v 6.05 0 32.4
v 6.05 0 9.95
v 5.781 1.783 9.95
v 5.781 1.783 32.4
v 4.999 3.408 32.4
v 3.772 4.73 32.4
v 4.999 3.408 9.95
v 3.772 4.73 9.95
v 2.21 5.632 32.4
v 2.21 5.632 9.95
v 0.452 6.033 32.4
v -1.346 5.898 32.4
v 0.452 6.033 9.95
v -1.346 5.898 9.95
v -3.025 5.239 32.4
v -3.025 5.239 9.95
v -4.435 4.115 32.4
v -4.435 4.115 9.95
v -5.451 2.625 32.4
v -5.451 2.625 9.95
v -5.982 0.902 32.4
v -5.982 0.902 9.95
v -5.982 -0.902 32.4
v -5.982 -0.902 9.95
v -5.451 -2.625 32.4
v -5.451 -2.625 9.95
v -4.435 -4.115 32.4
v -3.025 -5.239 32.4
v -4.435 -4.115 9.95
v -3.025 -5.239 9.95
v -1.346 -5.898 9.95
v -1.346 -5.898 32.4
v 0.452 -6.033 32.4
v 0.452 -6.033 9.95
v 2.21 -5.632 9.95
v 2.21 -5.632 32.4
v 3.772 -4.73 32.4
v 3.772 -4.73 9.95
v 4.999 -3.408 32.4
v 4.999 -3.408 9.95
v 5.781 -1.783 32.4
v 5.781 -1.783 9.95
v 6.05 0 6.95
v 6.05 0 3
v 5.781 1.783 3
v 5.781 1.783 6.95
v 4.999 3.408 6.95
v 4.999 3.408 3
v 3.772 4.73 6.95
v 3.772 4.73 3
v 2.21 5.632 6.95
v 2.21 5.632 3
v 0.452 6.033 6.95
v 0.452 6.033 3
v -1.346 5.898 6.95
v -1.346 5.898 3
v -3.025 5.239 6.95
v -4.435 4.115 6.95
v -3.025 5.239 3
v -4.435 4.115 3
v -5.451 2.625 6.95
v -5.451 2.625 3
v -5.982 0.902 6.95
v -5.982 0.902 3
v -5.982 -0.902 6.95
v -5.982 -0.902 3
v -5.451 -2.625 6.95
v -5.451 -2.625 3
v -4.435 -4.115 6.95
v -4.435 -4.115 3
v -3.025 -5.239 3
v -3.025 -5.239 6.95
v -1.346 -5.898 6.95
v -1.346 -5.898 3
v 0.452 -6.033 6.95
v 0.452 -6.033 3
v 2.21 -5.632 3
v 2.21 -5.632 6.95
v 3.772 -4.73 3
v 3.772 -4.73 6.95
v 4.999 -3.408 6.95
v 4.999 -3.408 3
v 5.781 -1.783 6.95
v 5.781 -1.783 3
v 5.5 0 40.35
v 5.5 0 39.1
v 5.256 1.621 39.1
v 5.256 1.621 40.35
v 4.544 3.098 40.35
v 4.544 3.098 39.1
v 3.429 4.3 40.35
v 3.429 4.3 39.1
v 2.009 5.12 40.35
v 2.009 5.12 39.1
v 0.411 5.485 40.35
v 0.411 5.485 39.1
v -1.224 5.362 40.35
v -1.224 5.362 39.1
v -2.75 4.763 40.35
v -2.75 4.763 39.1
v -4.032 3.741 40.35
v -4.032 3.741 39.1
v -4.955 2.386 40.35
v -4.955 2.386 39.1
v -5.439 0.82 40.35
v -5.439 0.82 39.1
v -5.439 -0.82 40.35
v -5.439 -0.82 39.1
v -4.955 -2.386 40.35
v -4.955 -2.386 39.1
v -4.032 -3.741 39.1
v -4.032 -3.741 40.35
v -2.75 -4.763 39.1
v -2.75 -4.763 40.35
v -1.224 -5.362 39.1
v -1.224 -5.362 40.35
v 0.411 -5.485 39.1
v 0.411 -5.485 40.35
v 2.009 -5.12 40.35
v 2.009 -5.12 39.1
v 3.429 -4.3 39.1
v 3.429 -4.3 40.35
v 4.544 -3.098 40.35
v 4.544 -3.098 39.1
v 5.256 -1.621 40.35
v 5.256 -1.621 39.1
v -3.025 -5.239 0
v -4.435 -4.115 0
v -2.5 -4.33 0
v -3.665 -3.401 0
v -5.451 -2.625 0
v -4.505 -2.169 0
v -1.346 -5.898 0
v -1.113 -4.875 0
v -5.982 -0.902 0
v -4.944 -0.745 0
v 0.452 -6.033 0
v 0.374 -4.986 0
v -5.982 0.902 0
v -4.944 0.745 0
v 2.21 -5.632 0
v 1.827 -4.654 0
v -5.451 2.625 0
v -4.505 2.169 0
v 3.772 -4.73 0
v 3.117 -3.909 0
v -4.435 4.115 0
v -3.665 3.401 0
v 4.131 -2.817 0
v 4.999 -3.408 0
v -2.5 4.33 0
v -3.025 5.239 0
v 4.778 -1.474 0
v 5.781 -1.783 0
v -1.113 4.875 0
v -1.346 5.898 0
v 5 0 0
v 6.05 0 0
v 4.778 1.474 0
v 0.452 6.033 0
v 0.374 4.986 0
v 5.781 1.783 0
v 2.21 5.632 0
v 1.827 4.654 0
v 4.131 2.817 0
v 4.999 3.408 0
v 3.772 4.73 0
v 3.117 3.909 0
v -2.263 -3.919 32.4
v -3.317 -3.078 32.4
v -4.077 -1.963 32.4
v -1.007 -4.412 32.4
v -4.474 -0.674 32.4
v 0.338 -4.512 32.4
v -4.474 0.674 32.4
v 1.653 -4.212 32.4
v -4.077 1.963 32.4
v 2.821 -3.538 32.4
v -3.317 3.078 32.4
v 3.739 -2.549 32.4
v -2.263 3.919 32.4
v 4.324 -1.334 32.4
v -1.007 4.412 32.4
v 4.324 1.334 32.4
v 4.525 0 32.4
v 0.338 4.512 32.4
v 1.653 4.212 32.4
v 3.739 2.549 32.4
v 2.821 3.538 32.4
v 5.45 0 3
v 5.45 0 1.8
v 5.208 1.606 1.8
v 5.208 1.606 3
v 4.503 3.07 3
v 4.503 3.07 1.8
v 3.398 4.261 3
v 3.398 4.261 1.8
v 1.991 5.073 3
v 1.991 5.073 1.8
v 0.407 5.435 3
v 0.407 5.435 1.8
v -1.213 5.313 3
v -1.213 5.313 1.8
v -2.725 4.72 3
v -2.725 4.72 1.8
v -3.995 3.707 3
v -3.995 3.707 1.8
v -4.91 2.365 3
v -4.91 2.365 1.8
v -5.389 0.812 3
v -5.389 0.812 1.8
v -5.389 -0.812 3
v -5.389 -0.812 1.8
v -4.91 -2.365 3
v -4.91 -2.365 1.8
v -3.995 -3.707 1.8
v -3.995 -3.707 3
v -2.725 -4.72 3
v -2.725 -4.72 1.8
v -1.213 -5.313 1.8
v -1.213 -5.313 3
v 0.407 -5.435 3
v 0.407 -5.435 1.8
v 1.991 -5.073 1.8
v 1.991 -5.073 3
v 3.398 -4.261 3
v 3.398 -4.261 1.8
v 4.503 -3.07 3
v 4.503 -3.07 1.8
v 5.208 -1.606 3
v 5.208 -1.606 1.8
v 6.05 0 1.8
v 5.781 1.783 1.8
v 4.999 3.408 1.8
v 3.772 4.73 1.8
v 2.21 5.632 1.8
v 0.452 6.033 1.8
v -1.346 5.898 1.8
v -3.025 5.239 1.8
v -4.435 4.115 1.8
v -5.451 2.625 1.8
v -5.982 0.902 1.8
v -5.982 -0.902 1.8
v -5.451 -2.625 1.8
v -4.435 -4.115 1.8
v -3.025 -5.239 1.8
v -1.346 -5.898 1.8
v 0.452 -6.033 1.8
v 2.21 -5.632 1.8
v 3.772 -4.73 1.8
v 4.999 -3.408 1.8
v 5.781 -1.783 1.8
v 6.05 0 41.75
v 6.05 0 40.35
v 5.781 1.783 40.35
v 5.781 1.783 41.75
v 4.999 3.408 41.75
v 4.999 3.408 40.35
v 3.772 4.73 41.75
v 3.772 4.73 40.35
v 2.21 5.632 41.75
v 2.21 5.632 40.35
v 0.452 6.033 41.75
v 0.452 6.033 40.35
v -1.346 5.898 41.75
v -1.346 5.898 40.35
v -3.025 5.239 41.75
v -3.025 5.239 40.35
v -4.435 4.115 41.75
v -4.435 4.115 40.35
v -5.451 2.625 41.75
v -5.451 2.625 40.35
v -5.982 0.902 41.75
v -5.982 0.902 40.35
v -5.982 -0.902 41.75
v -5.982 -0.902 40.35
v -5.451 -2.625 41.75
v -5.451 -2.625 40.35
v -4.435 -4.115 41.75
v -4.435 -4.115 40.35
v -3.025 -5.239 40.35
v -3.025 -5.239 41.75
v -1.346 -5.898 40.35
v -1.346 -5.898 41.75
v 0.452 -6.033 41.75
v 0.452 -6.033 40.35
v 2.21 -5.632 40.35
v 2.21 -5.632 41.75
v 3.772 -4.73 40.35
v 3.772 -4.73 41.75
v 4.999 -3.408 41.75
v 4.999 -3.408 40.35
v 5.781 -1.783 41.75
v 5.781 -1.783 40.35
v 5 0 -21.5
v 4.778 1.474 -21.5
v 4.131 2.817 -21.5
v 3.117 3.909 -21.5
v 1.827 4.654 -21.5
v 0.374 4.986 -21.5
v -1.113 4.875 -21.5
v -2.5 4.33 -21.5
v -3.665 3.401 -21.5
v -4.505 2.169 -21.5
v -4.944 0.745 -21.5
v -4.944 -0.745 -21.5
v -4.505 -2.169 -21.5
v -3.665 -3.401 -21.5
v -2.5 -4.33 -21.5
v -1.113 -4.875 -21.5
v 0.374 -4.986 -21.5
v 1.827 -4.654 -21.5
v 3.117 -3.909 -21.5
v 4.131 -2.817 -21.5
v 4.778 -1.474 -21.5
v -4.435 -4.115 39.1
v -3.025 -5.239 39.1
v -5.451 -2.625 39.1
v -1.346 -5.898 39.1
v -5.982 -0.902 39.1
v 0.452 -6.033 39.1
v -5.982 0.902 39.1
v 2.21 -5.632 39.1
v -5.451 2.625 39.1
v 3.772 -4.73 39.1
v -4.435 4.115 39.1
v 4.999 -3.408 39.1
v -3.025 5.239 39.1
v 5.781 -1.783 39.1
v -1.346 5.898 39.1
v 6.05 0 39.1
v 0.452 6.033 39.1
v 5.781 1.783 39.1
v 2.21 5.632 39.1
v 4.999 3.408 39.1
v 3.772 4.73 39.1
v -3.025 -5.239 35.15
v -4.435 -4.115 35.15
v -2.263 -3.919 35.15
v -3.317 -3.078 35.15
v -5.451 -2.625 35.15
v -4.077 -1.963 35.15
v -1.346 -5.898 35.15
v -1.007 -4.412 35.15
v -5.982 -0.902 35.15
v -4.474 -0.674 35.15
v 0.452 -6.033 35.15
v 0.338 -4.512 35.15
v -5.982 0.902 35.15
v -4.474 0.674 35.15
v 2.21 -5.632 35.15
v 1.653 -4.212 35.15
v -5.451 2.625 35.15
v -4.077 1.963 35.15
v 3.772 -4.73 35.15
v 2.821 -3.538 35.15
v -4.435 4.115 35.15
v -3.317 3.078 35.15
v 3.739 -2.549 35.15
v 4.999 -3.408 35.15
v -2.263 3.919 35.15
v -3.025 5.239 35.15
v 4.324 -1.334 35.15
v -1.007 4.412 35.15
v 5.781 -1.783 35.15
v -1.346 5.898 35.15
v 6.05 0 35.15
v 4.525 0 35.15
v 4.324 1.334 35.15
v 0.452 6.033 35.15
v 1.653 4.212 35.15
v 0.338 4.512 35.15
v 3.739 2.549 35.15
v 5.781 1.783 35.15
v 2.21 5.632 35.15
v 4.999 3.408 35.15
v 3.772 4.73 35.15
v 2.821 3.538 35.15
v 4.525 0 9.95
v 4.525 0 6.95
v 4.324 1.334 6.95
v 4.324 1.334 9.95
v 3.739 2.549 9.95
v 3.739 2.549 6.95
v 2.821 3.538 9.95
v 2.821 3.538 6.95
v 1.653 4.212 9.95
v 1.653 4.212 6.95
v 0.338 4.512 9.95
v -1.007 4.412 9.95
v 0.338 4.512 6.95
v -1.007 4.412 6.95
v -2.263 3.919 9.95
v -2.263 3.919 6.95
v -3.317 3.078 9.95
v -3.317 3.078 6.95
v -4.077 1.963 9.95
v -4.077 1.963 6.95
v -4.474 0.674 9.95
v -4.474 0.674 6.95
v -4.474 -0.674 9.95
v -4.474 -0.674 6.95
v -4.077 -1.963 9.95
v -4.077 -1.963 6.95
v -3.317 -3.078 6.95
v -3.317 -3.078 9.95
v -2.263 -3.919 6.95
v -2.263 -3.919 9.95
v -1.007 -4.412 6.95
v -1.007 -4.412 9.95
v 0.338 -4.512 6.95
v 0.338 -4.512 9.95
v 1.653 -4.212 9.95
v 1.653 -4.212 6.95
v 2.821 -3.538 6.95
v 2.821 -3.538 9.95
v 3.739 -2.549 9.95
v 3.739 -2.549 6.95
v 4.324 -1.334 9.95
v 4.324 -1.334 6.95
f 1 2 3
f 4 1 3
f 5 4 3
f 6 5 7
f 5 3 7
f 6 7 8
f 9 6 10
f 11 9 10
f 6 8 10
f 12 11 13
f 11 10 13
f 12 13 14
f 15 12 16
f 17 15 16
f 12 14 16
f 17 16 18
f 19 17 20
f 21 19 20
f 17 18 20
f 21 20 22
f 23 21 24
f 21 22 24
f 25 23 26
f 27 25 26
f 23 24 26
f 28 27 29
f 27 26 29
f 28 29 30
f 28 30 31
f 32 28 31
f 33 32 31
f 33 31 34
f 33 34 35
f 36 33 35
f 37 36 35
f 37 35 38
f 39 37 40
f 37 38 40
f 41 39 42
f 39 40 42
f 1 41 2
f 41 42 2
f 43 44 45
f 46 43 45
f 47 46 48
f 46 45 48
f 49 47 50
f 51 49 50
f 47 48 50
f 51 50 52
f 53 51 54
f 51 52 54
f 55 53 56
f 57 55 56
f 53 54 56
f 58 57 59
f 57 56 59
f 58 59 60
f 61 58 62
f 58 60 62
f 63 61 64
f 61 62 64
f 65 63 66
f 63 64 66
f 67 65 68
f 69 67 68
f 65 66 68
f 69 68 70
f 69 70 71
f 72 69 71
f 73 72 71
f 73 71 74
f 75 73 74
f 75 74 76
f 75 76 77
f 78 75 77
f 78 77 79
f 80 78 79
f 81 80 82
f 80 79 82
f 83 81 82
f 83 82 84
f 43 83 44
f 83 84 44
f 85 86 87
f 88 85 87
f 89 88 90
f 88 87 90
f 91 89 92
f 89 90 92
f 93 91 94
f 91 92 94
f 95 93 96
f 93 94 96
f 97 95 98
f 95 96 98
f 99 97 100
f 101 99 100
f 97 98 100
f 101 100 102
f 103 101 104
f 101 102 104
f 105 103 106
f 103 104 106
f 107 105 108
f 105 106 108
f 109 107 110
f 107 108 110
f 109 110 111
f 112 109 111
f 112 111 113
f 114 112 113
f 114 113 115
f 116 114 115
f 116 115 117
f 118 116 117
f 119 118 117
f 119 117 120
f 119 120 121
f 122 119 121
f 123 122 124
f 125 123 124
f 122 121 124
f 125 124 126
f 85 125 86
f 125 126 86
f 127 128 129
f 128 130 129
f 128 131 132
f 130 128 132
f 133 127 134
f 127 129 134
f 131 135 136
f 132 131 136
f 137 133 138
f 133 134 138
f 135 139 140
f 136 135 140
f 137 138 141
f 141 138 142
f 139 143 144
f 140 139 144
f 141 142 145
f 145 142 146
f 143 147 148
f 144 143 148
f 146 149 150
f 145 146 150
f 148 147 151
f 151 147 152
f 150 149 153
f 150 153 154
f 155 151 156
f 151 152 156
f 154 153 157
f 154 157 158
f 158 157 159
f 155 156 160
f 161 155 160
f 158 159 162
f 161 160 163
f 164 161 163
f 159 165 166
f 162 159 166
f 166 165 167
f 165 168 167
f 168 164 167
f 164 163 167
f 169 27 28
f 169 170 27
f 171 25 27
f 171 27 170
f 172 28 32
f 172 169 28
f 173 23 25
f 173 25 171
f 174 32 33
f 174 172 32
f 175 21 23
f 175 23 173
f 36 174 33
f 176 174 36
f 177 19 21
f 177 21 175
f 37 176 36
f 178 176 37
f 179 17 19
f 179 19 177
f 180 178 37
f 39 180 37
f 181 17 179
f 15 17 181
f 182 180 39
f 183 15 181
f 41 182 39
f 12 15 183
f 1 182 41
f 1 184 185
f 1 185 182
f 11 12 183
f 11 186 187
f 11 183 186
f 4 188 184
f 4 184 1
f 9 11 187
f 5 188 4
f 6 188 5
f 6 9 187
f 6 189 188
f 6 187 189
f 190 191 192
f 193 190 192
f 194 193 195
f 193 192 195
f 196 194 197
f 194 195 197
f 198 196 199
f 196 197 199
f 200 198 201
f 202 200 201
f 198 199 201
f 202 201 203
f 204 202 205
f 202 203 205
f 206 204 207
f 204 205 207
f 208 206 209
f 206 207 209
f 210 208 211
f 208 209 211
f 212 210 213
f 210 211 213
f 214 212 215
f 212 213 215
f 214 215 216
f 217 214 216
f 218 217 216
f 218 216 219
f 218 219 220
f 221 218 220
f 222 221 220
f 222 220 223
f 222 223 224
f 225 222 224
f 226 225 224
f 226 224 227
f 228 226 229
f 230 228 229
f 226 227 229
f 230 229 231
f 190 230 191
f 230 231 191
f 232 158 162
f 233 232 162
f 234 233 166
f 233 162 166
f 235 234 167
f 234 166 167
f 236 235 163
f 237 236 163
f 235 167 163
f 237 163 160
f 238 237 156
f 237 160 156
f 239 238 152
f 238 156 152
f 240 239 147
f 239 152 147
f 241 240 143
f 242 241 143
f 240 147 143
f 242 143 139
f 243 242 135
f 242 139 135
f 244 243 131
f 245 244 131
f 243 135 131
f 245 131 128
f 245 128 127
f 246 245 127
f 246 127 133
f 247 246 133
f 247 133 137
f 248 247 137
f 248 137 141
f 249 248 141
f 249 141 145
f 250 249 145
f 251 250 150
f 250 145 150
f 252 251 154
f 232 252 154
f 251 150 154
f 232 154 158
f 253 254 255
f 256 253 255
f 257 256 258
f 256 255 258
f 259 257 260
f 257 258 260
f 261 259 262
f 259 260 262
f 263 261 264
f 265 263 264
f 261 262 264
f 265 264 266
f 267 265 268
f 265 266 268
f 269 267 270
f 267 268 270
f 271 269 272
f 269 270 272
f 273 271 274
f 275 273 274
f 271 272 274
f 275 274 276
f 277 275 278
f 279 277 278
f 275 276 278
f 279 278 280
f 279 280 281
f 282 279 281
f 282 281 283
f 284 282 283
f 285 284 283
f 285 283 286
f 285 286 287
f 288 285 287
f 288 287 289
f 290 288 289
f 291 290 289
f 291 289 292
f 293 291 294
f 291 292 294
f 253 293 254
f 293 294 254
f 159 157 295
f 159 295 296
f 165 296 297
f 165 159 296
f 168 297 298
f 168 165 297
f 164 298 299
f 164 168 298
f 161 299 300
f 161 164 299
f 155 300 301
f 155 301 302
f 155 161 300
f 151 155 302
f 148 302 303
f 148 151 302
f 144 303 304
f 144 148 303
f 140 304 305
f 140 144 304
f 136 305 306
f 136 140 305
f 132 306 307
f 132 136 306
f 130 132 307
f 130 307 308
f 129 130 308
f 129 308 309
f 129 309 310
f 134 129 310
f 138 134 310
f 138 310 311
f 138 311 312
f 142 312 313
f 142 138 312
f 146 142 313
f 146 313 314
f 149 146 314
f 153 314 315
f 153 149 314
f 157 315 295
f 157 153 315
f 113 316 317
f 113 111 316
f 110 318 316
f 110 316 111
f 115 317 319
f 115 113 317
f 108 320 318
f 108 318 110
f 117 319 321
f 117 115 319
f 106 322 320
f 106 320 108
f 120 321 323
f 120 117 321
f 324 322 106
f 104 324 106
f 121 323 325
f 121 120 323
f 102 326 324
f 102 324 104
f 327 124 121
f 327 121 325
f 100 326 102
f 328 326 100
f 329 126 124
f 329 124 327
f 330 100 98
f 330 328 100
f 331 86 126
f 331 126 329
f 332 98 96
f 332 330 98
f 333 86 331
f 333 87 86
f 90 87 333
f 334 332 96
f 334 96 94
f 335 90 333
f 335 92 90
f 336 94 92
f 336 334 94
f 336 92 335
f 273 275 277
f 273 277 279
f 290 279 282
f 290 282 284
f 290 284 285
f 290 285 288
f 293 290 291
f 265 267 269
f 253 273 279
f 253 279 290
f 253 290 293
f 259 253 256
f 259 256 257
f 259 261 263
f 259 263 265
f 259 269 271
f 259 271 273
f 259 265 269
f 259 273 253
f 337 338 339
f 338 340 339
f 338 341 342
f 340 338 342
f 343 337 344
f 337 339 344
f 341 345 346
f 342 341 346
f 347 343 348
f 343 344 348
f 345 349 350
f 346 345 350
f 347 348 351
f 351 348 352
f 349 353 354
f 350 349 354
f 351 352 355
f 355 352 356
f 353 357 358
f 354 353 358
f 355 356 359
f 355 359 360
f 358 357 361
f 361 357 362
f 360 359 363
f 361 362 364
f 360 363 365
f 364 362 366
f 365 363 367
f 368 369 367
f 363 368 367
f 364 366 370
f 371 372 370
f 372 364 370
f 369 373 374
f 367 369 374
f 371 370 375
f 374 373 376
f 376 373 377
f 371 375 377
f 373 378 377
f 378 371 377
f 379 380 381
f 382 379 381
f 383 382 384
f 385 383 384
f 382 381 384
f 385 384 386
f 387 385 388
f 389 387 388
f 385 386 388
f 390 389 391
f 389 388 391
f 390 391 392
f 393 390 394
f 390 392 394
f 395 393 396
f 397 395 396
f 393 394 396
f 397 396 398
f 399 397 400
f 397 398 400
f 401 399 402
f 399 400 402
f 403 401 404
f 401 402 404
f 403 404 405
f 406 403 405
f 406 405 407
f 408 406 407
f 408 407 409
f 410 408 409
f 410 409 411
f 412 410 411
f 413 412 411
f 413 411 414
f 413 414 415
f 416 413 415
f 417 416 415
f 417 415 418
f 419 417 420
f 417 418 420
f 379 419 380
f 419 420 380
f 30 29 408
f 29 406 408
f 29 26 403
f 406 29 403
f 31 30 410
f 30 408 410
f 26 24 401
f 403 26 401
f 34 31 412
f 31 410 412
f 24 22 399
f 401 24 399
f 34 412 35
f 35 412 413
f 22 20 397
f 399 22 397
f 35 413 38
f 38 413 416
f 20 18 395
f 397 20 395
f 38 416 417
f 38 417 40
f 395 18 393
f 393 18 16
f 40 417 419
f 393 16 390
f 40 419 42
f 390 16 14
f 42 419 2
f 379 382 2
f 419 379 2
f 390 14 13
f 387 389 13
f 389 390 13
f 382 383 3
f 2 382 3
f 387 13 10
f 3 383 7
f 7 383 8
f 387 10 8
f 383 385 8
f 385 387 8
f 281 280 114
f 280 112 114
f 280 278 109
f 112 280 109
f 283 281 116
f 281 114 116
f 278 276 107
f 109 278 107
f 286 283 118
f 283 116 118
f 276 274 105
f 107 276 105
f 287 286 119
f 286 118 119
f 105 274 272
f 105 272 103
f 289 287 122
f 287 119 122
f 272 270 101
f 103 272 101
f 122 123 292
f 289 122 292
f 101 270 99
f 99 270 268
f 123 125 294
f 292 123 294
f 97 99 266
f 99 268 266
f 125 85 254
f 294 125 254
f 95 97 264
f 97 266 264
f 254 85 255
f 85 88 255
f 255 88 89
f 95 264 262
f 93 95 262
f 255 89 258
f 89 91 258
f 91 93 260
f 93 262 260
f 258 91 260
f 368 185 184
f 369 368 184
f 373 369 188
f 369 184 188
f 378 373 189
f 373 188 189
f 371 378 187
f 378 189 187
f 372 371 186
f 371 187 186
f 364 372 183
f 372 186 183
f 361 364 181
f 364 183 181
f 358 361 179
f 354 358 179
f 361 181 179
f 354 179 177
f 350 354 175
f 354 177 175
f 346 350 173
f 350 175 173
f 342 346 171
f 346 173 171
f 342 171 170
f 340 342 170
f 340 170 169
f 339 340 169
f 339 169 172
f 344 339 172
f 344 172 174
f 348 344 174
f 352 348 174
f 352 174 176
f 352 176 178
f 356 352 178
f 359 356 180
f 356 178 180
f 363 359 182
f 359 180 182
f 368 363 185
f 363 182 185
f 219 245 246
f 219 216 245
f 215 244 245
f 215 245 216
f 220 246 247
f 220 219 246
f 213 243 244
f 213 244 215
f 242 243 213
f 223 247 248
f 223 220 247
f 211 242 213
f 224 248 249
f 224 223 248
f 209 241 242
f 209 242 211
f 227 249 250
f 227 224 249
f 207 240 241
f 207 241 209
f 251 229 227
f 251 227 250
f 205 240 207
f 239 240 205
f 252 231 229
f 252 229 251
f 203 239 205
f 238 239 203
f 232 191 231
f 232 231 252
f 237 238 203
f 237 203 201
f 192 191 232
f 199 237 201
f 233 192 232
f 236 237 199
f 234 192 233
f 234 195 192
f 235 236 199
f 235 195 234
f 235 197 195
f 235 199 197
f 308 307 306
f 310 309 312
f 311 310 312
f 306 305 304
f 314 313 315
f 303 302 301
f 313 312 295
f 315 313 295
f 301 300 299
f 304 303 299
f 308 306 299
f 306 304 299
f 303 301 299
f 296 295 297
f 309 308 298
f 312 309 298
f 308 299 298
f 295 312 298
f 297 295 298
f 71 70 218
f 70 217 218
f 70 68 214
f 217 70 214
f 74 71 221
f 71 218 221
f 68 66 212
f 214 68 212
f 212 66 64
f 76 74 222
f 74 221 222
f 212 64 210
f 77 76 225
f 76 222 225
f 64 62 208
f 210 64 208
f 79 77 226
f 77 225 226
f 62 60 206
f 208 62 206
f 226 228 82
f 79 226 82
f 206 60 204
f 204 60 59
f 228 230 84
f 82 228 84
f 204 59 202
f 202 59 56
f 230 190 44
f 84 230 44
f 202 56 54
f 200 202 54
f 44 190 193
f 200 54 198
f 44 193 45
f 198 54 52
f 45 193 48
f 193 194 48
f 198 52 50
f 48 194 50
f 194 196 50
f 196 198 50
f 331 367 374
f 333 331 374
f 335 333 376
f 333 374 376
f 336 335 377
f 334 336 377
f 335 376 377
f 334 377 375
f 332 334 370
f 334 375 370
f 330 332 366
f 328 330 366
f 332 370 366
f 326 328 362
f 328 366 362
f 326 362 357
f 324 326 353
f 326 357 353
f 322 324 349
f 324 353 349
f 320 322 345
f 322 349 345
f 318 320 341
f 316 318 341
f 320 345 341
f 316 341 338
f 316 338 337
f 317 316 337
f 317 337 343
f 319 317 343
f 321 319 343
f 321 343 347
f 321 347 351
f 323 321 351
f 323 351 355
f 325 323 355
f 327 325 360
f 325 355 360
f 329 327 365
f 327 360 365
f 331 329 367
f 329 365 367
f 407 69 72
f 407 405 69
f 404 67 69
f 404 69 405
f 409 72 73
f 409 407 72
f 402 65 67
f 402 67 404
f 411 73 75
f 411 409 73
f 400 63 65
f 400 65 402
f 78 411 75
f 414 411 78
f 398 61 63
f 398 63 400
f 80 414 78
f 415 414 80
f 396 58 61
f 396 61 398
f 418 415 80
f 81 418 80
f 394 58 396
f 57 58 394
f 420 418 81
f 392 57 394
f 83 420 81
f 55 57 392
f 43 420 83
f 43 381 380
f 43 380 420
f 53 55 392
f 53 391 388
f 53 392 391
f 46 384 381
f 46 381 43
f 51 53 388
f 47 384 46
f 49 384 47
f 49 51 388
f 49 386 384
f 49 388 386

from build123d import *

# Parameters (mm, degrees)
F0_R      = 5
F1_DEPTH  = 21.5
F2_R      = 6.05
F3_DEPTH  = 1.8
F4_R      = 5.45
F5_DEPTH  = 1.2
F6_R      = 6.05
F7_DEPTH  = 3.95
F8_R      = 4.525
F9_DEPTH  = 3
F10_R     = 6.05
F11_DEPTH = 22.45
F12_R     = 4.525
F13_DEPTH = 2.75
F14_R     = 6.05
F15_DEPTH = 3.95
F16_R     = 5.5
F17_DEPTH = 1.25
F18_R     = 6.05
F19_DEPTH = 1.4


with BuildPart() as f1:
    # F0 (on Top) → F1 (new body)
    with BuildSketch(Plane.XY):
        Circle(F0_R)
    extrude(amount=-F1_DEPTH)

    # F2 (on Top) → F3 (join)
    with BuildSketch(Plane.XY):
        Circle(F2_R)
    extrude(amount=F3_DEPTH)

    # F4 (on face) → F5 (join)
    with BuildSketch(Plane.XY.offset(1.8)):
        Circle(F4_R)
    extrude(amount=F5_DEPTH)

    # F6 (on face) → F7 (join)
    with BuildSketch(Plane.XY.offset(3)):
        Circle(F6_R)
    extrude(amount=F7_DEPTH)

    # F8 (on face) → F9 (join)
    with BuildSketch(Plane.XY.offset(6.95)):
        Circle(F8_R)
    extrude(amount=F9_DEPTH)

    # F10 (on face) → F11 (join)
    with BuildSketch(Plane.XY.offset(9.95)):
        Circle(F10_R)
    extrude(amount=F11_DEPTH)

    # F12 (on face) → F13 (join)
    with BuildSketch(Plane.XY.offset(32.4)):
        Circle(F12_R)
    extrude(amount=F13_DEPTH)

    # F14 (on face) → F15 (join)
    with BuildSketch(Plane.XY.offset(35.15)):
        Circle(F14_R)
    extrude(amount=F15_DEPTH)

    # F16 (on face) → F17 (join)
    with BuildSketch(Plane.XY.offset(39.1)):
        Circle(F16_R)
    extrude(amount=F17_DEPTH)

    # F18 (on face) → F19 (join)
    with BuildSketch(Plane.XY.offset(40.35)):
        Circle(F18_R)
    extrude(amount=F19_DEPTH)


solid = f1.part
